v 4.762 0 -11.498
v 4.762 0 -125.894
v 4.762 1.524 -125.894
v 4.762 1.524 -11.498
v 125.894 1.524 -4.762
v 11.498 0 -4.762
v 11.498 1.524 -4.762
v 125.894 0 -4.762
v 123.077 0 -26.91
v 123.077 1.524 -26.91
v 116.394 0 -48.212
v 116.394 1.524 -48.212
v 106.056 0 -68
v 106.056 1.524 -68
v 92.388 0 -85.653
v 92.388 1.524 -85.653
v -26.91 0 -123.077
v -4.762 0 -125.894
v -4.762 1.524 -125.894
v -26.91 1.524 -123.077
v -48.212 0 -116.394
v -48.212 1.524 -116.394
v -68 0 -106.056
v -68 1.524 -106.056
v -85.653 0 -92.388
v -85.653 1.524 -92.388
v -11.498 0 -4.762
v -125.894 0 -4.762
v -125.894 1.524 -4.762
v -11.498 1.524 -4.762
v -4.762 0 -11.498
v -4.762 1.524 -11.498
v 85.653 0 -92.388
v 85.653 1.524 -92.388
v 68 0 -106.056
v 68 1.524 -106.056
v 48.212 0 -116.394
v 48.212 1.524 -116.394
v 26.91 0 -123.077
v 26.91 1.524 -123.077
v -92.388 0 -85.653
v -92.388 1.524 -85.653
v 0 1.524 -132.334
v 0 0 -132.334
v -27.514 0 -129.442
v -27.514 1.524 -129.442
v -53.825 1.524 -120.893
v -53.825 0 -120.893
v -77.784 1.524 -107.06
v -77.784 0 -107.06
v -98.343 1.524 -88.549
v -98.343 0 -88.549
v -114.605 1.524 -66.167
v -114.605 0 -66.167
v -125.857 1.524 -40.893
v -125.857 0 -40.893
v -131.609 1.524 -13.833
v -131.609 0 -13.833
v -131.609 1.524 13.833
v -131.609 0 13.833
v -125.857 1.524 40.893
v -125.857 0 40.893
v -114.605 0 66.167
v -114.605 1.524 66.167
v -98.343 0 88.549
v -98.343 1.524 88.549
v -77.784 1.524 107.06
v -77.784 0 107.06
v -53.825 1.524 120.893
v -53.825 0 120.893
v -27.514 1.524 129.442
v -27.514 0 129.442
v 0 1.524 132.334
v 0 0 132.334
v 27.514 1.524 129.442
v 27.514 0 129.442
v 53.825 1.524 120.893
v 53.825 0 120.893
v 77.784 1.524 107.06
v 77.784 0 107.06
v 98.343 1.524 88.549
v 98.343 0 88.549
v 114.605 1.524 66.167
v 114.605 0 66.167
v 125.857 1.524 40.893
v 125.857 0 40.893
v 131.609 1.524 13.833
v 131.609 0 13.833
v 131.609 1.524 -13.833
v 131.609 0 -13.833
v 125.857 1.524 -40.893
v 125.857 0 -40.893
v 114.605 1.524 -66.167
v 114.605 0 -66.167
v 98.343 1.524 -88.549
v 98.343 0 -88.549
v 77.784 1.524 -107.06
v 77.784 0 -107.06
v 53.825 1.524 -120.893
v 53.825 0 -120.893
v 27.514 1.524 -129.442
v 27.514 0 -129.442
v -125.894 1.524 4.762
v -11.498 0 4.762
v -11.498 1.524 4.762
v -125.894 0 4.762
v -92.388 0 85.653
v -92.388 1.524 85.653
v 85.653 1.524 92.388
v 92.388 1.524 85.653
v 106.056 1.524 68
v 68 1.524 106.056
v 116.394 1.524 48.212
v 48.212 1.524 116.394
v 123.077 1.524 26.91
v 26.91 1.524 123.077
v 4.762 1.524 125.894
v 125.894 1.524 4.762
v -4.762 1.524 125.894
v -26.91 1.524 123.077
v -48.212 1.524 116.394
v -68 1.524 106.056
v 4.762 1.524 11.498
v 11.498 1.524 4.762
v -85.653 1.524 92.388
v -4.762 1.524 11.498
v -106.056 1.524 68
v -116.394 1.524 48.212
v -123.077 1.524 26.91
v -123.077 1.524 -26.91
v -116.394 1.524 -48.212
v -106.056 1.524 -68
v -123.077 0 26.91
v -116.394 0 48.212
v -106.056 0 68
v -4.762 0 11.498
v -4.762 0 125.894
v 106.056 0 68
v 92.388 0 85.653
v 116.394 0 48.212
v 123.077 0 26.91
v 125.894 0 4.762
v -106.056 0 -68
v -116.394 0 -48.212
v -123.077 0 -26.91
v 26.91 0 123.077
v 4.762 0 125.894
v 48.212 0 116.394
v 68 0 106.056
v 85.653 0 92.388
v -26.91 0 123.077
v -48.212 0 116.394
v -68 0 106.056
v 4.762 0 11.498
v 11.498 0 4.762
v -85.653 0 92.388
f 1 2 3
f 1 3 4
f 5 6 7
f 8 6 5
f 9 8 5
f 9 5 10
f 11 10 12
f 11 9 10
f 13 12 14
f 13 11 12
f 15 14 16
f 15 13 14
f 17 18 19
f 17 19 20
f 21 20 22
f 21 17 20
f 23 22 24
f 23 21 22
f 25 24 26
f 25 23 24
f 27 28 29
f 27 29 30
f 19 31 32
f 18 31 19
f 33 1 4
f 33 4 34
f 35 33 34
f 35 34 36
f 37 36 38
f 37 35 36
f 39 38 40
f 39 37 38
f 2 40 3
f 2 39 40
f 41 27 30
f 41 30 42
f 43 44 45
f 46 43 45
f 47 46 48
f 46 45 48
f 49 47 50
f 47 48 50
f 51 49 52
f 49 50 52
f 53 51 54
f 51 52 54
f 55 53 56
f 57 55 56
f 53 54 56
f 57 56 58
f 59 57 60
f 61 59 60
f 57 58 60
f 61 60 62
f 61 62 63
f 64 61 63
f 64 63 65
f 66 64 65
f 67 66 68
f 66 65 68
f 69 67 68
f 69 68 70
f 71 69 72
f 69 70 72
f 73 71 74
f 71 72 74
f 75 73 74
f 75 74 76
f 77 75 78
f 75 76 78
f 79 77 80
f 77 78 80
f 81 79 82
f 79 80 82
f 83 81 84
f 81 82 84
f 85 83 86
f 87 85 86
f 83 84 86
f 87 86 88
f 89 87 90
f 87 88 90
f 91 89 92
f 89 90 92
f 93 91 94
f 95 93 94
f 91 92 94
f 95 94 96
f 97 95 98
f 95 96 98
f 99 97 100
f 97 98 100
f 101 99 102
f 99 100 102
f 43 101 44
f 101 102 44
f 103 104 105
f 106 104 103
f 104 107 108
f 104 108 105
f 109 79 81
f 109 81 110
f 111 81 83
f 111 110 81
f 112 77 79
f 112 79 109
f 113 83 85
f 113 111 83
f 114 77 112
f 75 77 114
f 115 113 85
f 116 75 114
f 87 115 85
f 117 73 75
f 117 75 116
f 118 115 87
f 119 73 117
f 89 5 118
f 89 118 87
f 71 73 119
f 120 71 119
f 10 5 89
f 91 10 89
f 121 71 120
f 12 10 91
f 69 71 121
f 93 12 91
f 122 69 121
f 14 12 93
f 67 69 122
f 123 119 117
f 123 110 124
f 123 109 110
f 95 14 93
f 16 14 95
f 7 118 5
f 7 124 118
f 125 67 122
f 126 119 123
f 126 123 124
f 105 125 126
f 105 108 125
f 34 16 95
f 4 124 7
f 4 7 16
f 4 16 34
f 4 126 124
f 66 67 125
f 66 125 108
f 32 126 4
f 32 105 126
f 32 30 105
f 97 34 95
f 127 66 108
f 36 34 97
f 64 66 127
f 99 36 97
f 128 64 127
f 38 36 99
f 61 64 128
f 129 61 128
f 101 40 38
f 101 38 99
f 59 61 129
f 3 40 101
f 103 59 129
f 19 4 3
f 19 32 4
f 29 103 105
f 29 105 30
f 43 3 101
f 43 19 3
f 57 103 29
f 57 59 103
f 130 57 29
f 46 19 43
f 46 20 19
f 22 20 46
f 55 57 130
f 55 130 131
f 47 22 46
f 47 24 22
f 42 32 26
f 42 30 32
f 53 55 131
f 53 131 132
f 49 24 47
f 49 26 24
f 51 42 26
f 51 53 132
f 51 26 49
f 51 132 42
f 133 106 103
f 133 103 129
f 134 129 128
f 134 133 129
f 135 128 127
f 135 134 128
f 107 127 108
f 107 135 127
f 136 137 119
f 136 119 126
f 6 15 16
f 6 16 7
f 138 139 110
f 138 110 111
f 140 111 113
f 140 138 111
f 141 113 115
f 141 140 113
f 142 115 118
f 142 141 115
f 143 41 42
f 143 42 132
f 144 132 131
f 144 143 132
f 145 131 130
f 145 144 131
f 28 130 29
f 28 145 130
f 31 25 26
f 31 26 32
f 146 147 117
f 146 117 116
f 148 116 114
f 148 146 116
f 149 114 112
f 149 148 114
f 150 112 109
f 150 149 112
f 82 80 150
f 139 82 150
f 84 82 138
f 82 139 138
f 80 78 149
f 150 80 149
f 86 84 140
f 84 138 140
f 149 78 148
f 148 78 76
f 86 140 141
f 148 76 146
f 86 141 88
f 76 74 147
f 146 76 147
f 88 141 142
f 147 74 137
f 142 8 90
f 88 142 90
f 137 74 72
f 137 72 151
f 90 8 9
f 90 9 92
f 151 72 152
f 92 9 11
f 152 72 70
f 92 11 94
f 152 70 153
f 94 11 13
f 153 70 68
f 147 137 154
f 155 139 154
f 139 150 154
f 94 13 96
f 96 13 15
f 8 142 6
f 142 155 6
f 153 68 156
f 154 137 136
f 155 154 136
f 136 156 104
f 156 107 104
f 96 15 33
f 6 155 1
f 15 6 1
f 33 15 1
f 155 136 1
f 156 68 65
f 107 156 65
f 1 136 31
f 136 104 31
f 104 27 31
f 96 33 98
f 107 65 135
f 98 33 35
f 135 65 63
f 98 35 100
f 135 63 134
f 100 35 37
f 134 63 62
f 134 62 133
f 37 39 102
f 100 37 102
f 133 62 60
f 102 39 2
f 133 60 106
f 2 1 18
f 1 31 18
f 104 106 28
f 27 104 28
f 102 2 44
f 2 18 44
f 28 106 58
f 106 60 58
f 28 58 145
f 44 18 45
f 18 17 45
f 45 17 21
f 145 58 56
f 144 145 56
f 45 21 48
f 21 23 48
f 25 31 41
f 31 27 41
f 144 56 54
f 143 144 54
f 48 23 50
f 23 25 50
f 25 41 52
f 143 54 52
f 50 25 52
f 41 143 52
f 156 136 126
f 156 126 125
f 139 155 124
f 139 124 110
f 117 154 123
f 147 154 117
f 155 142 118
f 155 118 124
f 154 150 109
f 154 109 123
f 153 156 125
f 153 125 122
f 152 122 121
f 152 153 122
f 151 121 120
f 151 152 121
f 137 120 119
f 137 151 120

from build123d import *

# Parameters (mm, degrees)
SKETCH1_R           = 132.334
BOSS_EXTRUDE1_DEPTH = 1.524


with BuildPart() as part:
    # Sketch1 → Boss-Extrude1 (new body)
    with BuildSketch(Plane(origin=(0, 0, 0), x_dir=(1, 0, 0), z_dir=(0, 1, 0))):
        with Locations(Location((0, 0, 0), (0, 0, 90))):
            Circle(SKETCH1_R)
        with BuildLine():
            ThreePointArc((-92.388062371, 85.65287028), (-116.394039024, 48.211989543), (-125.893950807, 4.7625))
            Line((-125.893950807, 4.7625), (-11.497692091, 4.7625))
            Line((-11.497692091, 4.7625), (-92.388062371, 85.65287028))
        make_face(mode=Mode.SUBTRACT)
        with BuildLine():
            ThreePointArc((-125.893950807, -4.7625), (-116.394039024, -48.211989543), (-92.388062371, -85.65287028))
            Line((-92.388062371, -85.65287028), (-11.497692091, -4.7625))
            Line((-11.497692091, -4.7625), (-125.893950807, -4.7625))
        make_face(mode=Mode.SUBTRACT)
        with BuildLine():
            ThreePointArc((-85.65287028, -92.388062371), (-48.211989543, -116.394039024), (-4.7625, -125.893950807))
            Line((-4.7625, -125.893950807), (-4.7625, -11.497692091))
            Line((-4.7625, -11.497692091), (-85.65287028, -92.388062371))
        make_face(mode=Mode.SUBTRACT)
        with BuildLine():
            ThreePointArc((4.7625, -125.893950807), (48.211989543, -116.394039024), (85.65287028, -92.388062371))
            Line((85.65287028, -92.388062371), (4.7625, -11.497692091))
            Line((4.7625, -11.497692091), (4.7625, -125.893950807))
        make_face(mode=Mode.SUBTRACT)
        with BuildLine():
            ThreePointArc((92.388062371, -85.65287028), (116.394039024, -48.211989543), (125.893950807, -4.7625))
            Line((125.893950807, -4.7625), (11.497692091, -4.7625))
            Line((11.497692091, -4.7625), (92.388062371, -85.65287028))
        make_face(mode=Mode.SUBTRACT)
        with BuildLine():
            ThreePointArc((125.893950807, 4.7625), (116.394039024, 48.211989543), (92.388062371, 85.65287028))
            Line((92.388062371, 85.65287028), (11.497692091, 4.7625))
            Line((11.497692091, 4.7625), (125.893950807, 4.7625))
        make_face(mode=Mode.SUBTRACT)
        with BuildLine():
            ThreePointArc((85.65287028, 92.388062371), (48.211989543, 116.394039024), (4.7625, 125.893950807))
            Line((4.7625, 125.893950807), (4.7625, 11.497692091))
            Line((4.7625, 11.497692091), (85.65287028, 92.388062371))
        make_face(mode=Mode.SUBTRACT)
        with BuildLine():
            ThreePointArc((-4.7625, 125.893950807), (-48.211989543, 116.394039024), (-85.65287028, 92.388062371))
            Line((-85.65287028, 92.388062371), (-4.7625, 11.497692091))
            Line((-4.7625, 11.497692091), (-4.7625, 125.893950807))
        make_face(mode=Mode.SUBTRACT)
    extrude(amount=BOSS_EXTRUDE1_DEPTH)


solid = part.part
